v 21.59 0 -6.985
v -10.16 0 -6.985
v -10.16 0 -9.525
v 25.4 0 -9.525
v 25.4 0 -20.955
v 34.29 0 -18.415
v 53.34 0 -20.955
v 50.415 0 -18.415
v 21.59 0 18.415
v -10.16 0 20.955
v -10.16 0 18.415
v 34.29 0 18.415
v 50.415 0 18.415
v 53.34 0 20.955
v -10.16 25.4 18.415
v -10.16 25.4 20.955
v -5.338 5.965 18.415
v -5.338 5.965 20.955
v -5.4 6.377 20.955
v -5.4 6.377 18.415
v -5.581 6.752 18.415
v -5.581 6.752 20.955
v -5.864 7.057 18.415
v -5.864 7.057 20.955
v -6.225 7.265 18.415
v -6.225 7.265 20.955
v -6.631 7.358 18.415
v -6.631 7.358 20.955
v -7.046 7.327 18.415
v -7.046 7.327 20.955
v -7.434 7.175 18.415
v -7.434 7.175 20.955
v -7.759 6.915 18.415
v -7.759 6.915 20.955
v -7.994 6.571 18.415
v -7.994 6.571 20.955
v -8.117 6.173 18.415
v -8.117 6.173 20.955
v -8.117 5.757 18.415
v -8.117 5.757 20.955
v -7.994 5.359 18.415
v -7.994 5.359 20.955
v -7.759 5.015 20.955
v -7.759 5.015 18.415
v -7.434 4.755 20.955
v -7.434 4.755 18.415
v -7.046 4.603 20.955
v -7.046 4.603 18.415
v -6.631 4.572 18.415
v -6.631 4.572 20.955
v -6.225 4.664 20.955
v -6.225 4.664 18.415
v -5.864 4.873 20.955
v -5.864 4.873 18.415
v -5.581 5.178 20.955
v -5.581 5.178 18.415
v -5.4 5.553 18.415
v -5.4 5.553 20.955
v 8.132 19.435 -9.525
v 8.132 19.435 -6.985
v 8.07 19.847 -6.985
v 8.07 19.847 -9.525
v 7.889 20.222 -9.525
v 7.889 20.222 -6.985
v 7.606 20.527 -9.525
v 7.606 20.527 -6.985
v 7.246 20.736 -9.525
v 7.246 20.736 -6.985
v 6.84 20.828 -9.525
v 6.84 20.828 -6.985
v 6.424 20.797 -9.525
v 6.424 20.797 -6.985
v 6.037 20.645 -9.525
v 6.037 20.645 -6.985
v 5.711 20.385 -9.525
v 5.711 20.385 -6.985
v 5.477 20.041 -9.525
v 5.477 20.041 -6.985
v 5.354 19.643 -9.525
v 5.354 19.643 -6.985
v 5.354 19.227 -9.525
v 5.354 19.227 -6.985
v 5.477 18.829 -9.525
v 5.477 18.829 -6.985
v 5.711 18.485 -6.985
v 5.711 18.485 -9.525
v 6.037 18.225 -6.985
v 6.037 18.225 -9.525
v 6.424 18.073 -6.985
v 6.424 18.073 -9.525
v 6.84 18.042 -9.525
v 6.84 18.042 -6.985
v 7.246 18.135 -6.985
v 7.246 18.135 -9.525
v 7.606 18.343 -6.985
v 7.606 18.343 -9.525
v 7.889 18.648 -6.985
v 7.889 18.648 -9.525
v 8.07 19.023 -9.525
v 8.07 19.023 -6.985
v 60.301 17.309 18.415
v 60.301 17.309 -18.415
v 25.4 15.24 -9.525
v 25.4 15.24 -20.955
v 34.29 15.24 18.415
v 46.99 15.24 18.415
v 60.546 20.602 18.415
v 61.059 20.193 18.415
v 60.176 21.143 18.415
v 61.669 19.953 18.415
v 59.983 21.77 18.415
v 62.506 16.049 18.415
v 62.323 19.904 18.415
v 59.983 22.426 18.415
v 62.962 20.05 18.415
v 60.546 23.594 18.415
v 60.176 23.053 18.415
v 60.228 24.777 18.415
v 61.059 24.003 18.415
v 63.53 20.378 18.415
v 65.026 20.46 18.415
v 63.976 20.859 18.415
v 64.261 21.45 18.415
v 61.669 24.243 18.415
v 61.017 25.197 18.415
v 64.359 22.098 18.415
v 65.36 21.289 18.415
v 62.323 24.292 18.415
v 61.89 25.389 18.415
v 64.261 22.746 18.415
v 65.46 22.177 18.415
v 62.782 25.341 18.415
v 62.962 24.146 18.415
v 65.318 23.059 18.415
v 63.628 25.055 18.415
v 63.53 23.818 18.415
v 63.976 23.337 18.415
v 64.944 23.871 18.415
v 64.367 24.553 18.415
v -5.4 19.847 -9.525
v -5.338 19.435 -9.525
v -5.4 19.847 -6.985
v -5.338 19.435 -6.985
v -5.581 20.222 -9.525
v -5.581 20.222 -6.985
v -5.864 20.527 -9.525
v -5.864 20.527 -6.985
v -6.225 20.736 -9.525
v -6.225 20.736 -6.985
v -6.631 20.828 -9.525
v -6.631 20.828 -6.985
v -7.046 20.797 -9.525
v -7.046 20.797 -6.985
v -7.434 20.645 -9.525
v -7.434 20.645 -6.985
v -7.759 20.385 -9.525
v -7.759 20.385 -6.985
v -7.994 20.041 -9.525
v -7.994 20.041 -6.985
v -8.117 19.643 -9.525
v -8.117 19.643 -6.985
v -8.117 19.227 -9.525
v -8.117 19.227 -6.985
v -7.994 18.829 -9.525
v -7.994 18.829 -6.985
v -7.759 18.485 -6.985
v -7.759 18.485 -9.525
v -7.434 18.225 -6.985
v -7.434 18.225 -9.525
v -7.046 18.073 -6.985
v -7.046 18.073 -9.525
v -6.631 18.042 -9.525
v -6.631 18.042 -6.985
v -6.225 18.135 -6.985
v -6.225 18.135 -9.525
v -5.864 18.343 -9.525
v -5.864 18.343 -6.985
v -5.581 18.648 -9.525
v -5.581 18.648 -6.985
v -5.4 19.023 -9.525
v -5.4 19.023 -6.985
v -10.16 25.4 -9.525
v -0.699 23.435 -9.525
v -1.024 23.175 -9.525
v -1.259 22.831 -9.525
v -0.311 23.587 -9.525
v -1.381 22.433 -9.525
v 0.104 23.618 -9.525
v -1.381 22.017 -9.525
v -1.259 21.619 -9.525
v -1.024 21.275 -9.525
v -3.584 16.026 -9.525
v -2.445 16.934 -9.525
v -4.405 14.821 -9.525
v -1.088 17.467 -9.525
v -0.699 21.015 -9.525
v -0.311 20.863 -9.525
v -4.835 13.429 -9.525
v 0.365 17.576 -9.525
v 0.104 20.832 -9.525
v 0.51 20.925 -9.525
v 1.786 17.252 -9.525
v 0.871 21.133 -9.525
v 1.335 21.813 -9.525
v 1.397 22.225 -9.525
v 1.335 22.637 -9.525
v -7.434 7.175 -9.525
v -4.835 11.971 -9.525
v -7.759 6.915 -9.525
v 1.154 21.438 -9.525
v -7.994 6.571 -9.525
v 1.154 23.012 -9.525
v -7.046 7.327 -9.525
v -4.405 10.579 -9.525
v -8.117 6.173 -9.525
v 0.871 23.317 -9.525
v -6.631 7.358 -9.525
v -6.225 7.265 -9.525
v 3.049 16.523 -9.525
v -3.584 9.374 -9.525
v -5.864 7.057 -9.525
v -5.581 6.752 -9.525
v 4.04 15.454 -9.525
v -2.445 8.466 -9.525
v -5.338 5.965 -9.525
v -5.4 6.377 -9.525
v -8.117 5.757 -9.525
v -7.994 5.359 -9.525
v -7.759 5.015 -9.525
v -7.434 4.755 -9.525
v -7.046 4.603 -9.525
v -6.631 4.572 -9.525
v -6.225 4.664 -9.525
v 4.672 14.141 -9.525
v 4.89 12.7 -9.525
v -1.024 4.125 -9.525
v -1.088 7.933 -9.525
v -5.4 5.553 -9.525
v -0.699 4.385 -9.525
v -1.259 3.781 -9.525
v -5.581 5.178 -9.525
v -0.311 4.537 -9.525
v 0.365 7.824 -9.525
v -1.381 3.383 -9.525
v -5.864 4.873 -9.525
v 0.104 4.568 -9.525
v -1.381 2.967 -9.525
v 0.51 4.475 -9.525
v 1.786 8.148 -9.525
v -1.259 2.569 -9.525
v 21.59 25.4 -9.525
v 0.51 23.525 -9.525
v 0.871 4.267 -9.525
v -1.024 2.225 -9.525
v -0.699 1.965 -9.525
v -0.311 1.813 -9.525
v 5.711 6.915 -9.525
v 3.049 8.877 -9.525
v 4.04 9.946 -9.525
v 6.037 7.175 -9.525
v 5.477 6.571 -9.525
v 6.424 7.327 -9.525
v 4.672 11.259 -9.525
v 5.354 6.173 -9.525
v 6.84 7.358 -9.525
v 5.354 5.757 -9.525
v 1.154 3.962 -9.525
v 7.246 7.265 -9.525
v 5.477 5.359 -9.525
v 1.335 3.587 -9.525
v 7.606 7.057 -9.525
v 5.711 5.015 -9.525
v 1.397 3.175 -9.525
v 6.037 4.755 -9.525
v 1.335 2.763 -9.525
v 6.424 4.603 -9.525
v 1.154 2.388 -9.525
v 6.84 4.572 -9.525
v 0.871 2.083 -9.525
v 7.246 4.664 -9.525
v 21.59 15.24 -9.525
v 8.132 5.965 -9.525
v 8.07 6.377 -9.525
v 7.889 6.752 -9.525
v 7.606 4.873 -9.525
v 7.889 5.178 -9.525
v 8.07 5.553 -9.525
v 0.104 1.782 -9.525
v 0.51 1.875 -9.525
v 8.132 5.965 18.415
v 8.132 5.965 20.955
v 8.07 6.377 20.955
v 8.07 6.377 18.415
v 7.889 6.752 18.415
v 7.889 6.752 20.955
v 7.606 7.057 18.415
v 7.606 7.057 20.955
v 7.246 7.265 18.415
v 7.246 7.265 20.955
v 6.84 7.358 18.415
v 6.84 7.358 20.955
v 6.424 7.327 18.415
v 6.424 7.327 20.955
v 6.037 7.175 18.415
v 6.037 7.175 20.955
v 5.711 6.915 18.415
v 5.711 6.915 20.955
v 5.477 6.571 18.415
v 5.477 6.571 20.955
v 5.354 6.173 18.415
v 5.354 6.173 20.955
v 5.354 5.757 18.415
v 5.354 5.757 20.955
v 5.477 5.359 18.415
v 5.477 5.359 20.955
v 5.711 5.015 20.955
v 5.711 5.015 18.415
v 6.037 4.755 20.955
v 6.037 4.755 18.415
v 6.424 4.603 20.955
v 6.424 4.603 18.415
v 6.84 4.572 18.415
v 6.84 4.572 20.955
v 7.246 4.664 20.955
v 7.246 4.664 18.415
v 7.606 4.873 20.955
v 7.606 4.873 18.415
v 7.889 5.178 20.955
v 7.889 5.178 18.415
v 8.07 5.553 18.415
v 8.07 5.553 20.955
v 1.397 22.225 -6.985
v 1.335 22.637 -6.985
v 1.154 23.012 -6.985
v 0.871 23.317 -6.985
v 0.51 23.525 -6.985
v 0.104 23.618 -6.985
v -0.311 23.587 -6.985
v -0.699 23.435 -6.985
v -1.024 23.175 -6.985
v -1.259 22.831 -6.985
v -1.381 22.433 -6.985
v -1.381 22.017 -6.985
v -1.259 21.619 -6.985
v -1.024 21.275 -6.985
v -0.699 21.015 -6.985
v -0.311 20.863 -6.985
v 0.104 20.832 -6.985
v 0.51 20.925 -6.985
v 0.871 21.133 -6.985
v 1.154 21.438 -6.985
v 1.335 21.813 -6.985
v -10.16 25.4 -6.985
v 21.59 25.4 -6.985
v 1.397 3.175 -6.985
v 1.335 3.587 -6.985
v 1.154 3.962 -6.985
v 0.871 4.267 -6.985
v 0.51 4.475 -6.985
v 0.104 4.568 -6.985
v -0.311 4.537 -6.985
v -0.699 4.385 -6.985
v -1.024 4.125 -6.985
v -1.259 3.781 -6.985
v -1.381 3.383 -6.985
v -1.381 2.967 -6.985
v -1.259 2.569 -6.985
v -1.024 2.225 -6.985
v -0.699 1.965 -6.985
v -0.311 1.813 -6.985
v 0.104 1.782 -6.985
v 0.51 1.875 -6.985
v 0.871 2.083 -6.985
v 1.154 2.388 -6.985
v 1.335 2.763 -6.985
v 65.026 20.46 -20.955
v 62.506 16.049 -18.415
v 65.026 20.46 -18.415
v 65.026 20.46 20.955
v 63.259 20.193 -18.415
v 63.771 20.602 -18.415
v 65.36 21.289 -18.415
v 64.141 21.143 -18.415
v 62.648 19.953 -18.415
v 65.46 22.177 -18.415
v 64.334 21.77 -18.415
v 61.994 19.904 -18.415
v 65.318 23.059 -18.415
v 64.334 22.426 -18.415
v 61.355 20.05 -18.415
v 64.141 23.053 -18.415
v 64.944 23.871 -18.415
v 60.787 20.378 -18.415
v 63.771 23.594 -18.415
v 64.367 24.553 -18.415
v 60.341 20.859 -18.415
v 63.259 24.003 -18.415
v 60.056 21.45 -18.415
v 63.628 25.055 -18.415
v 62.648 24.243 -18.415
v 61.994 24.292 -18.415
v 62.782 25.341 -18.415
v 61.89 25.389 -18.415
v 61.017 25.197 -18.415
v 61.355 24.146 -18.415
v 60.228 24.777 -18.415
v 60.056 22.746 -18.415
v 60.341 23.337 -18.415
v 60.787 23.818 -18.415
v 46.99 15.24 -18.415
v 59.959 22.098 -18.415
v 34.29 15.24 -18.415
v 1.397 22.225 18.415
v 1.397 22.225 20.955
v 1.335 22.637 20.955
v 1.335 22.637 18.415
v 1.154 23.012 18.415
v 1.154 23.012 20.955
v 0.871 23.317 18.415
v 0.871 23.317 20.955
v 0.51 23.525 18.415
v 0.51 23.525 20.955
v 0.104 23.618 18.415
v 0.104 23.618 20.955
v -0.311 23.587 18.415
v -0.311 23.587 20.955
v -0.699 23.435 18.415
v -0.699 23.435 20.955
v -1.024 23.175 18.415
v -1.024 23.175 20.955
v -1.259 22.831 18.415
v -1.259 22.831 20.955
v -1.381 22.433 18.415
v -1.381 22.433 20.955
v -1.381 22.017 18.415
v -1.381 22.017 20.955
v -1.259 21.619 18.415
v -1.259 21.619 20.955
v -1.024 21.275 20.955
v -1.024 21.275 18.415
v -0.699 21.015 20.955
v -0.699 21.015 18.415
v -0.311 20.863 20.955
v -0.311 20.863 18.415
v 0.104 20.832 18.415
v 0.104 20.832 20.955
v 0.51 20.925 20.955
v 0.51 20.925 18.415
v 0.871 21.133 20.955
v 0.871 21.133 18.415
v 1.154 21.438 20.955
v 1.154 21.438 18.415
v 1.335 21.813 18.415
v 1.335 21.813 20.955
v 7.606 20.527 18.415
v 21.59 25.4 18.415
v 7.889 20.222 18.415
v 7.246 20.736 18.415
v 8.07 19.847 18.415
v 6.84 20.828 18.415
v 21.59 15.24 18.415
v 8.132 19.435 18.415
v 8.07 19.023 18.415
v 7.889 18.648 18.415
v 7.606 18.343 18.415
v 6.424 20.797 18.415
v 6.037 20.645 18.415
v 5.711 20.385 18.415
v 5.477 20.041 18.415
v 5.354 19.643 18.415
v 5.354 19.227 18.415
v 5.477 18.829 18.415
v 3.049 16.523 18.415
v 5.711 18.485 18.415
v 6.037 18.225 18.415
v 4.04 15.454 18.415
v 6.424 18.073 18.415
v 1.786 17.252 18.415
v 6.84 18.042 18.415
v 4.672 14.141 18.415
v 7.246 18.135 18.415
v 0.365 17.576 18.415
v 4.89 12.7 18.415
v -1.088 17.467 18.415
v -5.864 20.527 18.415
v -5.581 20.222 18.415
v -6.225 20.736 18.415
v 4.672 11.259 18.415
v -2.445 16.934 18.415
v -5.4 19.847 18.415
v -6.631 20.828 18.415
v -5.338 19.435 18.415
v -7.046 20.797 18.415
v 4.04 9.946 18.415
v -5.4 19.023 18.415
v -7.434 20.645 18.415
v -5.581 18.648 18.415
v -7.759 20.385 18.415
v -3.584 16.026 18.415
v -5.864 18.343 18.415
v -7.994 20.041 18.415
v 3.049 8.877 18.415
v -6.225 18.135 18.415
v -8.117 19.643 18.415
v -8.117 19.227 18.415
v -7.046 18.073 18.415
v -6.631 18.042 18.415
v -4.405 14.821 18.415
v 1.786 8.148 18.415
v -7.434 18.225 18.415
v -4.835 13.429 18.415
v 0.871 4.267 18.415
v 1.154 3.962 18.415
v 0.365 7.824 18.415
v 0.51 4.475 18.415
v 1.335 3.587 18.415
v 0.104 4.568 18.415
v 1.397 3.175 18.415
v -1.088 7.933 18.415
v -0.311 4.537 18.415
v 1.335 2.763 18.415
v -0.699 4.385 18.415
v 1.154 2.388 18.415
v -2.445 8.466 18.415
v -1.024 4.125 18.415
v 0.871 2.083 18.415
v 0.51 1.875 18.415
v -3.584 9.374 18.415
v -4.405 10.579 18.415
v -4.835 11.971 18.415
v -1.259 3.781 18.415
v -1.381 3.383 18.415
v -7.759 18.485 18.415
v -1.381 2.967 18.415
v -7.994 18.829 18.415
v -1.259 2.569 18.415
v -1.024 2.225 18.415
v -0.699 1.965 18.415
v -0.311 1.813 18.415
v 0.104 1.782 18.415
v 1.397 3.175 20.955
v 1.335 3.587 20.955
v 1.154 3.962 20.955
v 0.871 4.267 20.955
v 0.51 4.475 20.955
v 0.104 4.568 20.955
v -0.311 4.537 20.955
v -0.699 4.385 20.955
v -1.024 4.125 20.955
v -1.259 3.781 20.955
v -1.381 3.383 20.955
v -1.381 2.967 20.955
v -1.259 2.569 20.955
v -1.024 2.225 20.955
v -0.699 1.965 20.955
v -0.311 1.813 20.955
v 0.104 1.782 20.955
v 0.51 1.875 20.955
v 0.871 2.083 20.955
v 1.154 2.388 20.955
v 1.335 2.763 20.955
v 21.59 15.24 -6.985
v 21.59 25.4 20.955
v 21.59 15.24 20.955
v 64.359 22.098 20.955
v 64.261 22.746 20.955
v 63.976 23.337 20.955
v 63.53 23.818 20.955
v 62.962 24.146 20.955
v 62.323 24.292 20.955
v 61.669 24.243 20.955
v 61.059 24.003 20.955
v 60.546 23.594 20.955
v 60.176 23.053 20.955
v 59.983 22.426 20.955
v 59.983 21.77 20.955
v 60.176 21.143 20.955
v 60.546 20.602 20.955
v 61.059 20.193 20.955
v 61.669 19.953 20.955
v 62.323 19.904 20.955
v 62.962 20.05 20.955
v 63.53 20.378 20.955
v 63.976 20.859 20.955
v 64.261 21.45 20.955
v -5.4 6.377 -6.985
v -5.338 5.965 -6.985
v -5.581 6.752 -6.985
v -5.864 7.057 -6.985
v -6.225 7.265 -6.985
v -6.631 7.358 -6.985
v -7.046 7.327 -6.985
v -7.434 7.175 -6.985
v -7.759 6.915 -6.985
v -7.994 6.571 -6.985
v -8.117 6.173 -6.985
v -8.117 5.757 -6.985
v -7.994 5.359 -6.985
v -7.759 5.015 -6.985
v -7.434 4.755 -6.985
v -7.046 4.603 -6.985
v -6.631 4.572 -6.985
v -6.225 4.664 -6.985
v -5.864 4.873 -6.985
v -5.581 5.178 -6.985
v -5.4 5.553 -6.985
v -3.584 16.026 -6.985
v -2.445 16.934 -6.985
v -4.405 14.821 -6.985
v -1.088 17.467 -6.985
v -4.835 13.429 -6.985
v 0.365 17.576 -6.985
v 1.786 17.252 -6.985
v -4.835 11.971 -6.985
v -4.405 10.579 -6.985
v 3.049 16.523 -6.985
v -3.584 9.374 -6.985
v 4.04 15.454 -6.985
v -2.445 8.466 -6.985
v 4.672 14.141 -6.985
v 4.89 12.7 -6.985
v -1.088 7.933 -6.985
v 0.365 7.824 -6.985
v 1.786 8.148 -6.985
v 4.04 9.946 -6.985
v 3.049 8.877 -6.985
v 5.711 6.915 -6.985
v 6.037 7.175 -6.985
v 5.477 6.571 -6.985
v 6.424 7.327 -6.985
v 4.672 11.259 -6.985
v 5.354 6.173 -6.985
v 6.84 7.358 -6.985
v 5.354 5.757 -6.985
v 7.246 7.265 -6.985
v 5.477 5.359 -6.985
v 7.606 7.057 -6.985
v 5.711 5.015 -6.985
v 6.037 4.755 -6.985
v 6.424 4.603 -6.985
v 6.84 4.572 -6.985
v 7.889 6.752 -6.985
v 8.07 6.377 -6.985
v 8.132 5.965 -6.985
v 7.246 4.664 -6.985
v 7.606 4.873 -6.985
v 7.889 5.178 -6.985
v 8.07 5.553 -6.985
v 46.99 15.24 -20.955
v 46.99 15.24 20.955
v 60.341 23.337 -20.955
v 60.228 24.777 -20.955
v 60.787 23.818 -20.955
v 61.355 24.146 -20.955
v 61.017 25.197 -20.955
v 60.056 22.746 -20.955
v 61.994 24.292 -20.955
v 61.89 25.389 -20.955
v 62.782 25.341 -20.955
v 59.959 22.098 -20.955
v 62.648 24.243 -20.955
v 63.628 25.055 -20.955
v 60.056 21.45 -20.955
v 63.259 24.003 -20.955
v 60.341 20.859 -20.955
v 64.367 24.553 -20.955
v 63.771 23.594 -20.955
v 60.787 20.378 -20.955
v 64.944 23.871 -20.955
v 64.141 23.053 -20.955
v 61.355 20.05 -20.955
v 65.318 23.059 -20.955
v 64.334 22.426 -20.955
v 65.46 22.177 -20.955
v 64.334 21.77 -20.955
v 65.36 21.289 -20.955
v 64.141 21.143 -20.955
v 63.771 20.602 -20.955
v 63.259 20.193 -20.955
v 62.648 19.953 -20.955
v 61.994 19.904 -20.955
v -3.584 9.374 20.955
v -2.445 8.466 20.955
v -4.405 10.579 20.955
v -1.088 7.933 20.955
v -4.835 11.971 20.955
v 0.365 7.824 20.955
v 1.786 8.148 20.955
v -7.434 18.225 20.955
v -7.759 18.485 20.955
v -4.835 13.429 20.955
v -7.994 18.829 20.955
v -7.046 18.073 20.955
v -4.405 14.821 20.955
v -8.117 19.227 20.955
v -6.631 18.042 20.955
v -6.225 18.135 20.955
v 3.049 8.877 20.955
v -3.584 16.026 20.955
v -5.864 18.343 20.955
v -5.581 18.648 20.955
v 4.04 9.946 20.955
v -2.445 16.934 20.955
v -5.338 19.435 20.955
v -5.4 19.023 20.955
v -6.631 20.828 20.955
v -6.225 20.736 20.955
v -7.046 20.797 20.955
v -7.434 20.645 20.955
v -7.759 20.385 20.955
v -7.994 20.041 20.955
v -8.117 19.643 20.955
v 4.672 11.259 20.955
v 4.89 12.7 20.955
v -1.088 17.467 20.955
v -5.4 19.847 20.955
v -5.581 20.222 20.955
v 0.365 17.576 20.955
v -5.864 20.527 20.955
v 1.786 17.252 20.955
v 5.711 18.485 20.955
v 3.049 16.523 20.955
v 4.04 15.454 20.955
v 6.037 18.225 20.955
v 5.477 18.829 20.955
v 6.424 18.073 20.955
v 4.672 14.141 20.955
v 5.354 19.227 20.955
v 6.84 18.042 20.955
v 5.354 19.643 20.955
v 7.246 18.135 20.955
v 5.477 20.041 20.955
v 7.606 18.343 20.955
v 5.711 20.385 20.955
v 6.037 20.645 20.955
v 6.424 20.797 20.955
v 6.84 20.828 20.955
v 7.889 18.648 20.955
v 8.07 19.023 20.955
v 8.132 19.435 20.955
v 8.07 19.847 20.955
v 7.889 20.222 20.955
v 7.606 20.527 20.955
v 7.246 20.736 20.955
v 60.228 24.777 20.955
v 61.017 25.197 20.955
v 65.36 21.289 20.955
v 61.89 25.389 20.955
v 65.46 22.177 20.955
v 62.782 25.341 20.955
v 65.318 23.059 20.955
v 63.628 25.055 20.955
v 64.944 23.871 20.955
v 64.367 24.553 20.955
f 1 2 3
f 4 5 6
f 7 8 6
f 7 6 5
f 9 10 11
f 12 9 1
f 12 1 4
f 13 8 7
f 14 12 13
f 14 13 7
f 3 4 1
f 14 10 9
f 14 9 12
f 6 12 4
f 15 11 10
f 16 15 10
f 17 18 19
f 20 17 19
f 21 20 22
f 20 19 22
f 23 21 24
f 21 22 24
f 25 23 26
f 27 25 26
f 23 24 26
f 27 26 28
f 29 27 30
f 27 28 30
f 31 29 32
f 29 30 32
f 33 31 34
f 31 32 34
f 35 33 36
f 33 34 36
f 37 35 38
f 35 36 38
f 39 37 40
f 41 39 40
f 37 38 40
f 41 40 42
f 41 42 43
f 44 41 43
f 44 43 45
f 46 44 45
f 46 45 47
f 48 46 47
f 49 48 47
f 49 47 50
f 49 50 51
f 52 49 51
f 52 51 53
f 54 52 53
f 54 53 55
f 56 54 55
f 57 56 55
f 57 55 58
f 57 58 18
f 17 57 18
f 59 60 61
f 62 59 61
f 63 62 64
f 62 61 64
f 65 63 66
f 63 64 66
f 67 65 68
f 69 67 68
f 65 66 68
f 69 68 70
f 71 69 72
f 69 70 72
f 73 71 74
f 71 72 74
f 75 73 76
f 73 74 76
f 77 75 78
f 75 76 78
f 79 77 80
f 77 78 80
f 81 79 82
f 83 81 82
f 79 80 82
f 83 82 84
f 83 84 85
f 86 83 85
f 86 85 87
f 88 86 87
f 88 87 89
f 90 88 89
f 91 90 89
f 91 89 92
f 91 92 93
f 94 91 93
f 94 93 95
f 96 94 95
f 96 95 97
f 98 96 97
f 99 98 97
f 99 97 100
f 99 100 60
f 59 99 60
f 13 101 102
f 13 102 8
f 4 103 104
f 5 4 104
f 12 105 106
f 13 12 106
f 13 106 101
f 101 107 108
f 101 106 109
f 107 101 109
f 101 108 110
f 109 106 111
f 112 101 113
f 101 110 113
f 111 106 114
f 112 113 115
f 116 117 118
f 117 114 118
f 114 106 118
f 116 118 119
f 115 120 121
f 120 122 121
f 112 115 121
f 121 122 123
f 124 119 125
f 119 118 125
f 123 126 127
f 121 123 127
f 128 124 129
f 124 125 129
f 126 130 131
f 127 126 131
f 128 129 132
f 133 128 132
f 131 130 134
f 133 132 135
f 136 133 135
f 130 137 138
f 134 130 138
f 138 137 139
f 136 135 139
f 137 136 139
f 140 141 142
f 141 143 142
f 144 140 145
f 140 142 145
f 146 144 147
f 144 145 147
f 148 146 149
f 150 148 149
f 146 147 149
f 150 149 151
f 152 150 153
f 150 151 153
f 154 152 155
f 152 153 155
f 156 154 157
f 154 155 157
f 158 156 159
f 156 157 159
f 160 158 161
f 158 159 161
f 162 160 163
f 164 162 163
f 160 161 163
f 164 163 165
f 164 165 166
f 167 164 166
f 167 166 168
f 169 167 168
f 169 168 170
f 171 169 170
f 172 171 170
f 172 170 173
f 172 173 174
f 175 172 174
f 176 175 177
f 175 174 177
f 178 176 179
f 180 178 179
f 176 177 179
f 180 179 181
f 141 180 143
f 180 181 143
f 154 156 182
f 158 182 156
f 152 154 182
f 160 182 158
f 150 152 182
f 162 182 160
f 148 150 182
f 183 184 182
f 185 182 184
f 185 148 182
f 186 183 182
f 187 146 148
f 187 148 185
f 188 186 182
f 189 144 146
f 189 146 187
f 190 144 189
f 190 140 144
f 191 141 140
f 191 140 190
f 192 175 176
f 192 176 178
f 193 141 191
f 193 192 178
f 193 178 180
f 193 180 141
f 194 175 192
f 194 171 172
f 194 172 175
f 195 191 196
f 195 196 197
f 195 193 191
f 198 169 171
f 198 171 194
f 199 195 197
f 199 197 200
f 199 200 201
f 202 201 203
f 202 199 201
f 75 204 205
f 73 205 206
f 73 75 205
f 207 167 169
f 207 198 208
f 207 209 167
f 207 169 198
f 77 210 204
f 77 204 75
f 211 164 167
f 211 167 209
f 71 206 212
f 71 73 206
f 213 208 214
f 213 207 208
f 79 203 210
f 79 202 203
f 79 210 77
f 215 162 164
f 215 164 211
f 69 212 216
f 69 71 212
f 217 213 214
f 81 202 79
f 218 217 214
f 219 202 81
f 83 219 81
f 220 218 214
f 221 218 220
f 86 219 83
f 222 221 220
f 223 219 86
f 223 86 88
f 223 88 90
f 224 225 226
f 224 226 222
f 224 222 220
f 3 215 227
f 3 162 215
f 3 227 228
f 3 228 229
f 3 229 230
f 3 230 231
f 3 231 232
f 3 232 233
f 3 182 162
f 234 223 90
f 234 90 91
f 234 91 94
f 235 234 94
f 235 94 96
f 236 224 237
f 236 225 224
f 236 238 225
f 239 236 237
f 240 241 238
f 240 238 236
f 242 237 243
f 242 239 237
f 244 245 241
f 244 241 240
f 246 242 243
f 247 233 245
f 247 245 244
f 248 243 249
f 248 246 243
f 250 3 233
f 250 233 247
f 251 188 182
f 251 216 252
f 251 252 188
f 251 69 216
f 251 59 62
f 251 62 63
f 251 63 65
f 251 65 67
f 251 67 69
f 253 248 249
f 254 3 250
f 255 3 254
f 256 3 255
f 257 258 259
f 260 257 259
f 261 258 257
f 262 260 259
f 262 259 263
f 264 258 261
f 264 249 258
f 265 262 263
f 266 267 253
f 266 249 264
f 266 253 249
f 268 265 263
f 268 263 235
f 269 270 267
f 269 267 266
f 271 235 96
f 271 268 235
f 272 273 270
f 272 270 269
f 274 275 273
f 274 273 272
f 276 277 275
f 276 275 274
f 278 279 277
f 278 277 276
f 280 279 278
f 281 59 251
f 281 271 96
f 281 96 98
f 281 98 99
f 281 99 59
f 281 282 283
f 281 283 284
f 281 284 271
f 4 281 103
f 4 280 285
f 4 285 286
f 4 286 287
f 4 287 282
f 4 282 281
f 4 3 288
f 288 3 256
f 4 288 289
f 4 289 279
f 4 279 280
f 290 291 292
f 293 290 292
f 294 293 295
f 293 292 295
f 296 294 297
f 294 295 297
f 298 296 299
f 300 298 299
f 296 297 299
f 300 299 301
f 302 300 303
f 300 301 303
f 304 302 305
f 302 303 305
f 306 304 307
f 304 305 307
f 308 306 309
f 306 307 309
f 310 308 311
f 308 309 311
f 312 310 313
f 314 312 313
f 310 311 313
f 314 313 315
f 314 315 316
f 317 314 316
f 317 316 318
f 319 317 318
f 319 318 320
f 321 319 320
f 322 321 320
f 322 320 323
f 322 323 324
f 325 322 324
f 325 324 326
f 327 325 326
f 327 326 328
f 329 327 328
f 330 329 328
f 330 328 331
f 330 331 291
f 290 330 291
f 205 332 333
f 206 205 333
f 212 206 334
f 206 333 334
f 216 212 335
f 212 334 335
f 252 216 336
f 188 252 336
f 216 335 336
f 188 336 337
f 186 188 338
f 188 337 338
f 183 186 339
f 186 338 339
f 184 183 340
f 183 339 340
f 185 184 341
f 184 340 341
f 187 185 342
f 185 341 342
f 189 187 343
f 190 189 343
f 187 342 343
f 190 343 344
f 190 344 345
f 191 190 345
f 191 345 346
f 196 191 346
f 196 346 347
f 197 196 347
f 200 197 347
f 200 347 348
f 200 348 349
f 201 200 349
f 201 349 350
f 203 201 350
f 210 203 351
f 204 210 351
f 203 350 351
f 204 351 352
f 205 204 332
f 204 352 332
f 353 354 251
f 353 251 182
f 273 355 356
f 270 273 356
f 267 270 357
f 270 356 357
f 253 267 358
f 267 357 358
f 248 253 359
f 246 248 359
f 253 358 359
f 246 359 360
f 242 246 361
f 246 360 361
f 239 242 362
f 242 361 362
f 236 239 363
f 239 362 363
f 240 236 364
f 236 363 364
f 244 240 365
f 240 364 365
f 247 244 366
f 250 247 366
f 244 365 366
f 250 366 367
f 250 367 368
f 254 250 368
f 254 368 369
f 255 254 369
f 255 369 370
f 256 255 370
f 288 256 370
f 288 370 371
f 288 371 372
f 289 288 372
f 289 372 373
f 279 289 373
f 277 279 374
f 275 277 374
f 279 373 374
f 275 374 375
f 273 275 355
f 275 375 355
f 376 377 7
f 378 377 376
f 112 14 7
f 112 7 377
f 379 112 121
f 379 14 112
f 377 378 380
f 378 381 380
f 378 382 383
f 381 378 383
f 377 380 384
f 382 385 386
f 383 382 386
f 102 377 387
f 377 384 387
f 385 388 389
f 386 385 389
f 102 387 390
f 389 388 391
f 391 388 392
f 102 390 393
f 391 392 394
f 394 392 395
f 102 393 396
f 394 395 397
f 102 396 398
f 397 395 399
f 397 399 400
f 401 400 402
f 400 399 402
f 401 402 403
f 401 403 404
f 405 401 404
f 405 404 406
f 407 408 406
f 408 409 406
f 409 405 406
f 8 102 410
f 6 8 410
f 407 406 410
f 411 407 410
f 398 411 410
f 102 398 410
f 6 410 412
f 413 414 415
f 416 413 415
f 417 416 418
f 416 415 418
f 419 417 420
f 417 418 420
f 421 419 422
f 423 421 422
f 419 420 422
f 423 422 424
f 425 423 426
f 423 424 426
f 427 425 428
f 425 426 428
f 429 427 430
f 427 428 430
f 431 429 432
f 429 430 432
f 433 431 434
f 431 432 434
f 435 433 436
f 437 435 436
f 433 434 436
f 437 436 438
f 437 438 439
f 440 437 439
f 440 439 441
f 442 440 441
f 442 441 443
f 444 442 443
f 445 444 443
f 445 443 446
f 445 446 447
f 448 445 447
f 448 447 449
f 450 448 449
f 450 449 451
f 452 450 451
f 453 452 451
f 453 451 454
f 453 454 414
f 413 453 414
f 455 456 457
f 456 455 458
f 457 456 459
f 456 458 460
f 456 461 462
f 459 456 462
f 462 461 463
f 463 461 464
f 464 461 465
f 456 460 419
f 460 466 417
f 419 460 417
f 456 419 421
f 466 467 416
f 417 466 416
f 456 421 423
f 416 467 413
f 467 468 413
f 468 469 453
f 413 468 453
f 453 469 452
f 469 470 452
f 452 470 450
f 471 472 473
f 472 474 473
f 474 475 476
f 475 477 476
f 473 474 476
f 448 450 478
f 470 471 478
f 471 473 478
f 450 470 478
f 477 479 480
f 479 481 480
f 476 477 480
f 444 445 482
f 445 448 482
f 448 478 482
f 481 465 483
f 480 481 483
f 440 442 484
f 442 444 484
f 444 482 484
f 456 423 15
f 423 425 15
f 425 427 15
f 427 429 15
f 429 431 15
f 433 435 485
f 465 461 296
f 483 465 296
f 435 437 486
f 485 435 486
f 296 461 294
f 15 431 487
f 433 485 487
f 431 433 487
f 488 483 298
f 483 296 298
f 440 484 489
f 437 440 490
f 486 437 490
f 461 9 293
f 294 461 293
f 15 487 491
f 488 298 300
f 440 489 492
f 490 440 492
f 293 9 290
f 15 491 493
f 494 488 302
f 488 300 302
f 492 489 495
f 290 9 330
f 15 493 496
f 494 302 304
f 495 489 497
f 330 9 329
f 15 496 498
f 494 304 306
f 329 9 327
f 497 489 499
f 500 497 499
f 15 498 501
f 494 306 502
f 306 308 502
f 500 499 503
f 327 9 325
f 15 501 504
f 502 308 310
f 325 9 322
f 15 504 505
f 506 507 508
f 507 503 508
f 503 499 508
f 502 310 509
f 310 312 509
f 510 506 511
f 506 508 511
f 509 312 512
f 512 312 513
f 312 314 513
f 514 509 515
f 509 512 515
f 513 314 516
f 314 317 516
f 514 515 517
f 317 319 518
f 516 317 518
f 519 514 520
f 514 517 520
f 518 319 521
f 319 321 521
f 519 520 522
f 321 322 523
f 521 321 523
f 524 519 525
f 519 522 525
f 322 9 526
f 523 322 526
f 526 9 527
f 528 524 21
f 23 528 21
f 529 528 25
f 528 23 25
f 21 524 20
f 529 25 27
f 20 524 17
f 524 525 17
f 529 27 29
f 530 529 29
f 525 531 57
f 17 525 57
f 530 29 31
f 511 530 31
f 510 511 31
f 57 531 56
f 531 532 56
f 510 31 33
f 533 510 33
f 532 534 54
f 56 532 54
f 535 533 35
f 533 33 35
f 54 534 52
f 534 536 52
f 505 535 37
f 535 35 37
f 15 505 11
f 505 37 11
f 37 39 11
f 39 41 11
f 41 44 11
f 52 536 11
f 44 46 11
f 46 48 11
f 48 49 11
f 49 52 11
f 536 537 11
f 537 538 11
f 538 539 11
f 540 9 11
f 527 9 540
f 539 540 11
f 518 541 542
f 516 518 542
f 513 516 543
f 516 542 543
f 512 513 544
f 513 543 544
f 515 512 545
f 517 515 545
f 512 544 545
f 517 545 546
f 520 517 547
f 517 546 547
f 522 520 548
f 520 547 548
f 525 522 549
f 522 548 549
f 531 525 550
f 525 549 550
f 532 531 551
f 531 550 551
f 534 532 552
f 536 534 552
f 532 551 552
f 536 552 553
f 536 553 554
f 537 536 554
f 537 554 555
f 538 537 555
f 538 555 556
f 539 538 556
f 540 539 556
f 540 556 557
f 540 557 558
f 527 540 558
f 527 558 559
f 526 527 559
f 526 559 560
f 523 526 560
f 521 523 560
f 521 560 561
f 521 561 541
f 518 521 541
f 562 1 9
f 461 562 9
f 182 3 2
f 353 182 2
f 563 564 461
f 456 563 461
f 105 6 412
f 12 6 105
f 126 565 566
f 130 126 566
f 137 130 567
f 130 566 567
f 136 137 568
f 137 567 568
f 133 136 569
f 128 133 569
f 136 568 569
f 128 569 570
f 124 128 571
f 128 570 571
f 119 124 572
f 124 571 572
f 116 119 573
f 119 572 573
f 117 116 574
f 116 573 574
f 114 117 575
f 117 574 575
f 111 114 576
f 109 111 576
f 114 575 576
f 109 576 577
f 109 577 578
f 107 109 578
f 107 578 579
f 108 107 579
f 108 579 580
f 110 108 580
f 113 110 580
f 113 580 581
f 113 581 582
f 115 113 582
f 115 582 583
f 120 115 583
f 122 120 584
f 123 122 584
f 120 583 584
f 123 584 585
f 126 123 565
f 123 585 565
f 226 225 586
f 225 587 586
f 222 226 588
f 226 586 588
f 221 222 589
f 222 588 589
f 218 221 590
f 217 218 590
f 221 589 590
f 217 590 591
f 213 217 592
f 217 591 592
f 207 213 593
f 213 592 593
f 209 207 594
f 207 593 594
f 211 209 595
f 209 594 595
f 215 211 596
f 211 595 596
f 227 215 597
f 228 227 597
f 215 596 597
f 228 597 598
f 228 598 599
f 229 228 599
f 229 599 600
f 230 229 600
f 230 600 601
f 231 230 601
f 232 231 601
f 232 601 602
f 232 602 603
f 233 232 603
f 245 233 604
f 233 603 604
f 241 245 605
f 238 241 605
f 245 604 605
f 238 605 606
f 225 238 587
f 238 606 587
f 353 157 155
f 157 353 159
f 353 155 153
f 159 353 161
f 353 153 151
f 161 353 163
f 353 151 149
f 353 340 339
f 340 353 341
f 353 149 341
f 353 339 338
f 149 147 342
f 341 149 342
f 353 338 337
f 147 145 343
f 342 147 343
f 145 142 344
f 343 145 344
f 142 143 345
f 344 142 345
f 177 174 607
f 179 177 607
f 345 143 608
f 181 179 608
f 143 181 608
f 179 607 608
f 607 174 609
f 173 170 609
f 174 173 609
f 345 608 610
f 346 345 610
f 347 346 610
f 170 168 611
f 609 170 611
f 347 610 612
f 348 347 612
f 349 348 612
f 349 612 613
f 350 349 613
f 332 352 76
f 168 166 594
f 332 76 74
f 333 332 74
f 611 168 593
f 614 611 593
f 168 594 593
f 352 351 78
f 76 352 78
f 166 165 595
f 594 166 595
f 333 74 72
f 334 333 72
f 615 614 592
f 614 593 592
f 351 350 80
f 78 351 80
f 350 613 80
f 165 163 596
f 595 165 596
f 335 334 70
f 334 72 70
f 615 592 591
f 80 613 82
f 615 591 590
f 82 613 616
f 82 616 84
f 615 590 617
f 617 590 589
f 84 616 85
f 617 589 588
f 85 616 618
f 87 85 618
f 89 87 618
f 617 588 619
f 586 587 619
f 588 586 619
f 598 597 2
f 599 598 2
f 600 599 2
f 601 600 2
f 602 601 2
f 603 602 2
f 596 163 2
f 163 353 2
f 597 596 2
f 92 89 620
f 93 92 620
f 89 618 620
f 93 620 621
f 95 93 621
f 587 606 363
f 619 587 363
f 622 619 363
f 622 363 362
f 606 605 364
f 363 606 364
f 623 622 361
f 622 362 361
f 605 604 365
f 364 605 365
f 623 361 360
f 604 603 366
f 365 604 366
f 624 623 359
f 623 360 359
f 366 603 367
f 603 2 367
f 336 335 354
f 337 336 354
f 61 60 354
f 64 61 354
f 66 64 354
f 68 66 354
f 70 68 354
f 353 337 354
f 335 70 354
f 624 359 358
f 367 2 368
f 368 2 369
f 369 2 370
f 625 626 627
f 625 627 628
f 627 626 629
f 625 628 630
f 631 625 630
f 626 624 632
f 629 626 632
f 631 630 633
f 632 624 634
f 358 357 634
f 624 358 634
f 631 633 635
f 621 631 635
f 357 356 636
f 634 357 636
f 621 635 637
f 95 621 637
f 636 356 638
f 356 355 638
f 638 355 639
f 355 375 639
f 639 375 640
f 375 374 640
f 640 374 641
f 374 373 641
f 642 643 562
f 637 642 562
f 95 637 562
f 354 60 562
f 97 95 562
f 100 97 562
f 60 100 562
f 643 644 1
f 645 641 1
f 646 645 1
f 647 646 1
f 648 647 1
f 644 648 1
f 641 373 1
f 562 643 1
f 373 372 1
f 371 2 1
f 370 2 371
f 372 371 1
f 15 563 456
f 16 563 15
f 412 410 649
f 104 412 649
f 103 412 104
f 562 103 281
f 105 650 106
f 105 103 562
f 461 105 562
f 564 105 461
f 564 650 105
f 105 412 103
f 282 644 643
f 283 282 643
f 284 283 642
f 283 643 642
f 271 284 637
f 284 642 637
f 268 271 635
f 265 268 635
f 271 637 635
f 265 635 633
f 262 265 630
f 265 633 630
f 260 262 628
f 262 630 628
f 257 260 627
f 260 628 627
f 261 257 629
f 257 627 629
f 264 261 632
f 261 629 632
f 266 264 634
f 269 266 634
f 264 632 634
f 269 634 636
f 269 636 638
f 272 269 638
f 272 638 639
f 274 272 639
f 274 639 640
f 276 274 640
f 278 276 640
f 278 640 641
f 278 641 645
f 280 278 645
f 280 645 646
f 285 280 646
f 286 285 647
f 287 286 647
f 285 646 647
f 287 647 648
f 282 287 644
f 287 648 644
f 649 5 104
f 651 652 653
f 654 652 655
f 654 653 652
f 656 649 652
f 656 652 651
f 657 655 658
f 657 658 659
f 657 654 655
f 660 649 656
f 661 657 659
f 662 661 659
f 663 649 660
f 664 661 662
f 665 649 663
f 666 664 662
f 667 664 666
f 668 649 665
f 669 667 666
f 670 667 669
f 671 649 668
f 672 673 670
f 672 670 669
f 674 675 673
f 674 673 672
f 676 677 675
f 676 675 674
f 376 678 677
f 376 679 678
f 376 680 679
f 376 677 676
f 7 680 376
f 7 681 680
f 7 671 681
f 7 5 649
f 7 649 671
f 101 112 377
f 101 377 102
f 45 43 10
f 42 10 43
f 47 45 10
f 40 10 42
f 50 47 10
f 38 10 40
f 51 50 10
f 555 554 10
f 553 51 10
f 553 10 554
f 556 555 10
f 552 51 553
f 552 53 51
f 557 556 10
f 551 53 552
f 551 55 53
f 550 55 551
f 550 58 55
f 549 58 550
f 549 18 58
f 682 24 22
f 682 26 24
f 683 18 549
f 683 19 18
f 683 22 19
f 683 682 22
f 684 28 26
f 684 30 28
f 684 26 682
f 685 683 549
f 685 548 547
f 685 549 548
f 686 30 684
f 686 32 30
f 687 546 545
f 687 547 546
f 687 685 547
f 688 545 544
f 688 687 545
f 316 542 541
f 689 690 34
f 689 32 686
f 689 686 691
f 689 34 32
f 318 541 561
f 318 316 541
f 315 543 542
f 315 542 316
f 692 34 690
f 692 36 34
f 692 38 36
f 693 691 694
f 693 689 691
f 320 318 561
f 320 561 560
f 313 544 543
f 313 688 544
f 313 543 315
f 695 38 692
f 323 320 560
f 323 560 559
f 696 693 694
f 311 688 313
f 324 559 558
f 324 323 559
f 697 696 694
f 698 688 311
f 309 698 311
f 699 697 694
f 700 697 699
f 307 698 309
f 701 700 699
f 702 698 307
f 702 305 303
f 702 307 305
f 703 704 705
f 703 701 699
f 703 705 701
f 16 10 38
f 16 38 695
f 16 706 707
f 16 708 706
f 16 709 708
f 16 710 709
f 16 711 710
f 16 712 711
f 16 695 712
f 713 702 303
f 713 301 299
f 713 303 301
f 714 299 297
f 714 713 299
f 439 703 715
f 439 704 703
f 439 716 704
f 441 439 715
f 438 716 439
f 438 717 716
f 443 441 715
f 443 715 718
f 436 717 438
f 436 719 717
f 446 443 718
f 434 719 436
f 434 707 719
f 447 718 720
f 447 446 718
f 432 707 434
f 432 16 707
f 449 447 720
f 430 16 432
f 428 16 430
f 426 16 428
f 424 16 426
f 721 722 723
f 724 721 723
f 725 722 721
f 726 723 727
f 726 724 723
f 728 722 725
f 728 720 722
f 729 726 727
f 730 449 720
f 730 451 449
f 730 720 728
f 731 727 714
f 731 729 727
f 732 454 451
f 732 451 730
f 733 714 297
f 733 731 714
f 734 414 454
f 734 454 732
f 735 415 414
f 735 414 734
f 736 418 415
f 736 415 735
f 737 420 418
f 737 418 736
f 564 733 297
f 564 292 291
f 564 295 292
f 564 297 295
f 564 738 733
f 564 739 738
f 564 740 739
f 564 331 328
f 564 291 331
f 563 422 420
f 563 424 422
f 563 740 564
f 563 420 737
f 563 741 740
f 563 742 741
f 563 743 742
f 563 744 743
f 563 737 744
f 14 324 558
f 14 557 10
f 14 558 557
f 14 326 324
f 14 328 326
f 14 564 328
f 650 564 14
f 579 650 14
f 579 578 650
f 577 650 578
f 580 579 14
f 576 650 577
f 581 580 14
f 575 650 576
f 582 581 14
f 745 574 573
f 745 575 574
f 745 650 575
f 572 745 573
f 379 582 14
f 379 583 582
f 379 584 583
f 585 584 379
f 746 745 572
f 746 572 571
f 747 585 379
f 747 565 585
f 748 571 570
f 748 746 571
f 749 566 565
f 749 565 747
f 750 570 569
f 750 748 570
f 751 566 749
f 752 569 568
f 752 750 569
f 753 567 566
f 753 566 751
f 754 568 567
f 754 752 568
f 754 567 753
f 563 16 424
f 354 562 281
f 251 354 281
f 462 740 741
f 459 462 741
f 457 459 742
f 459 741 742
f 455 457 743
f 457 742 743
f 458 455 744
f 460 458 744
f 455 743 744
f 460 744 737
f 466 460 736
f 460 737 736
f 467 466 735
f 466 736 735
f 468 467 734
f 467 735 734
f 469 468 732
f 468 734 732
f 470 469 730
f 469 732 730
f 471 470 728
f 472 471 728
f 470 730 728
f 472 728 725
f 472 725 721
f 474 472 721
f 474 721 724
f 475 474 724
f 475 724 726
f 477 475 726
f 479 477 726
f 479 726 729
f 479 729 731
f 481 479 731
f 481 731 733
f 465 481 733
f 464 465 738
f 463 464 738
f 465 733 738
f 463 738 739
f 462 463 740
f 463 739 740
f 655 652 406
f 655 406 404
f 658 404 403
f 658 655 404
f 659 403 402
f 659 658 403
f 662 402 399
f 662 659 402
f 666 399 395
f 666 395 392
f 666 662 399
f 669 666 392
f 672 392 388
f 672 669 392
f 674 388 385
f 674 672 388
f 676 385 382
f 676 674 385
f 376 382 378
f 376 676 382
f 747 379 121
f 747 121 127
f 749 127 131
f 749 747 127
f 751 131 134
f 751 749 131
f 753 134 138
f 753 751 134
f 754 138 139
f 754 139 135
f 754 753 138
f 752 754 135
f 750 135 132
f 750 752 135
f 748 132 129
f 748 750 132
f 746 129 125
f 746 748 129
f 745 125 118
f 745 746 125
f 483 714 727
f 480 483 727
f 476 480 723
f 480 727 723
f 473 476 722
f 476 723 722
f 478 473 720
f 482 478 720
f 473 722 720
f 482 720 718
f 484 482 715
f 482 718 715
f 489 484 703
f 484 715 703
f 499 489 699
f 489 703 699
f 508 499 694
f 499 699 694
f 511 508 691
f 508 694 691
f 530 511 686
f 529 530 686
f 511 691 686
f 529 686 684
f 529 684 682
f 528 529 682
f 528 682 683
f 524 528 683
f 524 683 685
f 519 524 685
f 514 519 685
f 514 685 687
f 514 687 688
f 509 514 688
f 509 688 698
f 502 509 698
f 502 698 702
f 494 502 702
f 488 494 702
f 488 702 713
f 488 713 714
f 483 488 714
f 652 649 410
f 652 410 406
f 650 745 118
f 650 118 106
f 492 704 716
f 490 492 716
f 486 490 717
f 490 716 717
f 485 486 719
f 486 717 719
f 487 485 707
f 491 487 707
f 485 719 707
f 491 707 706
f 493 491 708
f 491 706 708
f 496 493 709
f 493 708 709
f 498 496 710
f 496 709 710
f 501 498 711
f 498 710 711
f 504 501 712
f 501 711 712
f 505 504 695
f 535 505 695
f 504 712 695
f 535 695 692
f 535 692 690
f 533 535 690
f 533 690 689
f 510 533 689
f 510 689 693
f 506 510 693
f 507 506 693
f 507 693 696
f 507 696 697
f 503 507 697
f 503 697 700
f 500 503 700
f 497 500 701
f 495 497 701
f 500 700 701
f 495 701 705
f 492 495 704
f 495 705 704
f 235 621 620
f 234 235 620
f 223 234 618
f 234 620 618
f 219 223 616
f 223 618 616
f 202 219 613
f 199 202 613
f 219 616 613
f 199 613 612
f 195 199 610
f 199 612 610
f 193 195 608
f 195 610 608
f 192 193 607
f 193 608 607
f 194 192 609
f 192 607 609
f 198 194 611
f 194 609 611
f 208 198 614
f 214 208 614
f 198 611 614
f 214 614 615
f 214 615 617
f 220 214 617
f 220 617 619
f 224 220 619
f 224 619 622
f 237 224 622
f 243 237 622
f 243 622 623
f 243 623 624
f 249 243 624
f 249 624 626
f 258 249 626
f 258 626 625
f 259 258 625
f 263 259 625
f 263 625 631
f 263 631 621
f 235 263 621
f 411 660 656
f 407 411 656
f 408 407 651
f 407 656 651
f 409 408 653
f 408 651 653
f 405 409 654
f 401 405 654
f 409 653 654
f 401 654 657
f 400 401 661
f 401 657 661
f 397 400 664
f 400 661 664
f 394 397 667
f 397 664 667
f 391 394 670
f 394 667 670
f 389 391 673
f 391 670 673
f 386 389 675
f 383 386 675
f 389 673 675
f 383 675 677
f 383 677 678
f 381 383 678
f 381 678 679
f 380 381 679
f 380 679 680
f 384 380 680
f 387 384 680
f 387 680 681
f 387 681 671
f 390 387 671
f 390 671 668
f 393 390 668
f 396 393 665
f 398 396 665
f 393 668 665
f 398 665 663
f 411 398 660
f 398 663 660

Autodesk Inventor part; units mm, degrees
ref_plane "YZ Plane" through (0, 0, 0) normal (1, 0, 0) x (0, 1, 0)
ref_plane "XZ Plane" through (0, 0, 0) normal (0, 1, 0) x (-1, 0, 0)
ref_plane "XY Plane" through (0, 0, 0) normal (0, 0, 1) x (1, 0, 0)
sketch "Sketch1" plane through (0, 0, 0) normal (0, 1, 0) x (-1, 0, 0)
  line L0 (10.16, 20.955) -> (-21.59, 20.955)
  line L1 (-21.59, 20.955) -> (-21.59, 18.415)
  line L2 (-21.59, 18.415) -> (10.16, 18.415)
  line L3 (10.16, 18.415) -> (10.16, 20.955)
  line L4 (10.16, -6.985) -> (-21.59, -6.985)
  line L5 (-21.59, -6.985) -> (-21.59, -9.525)
  line L6 (-21.59, -9.525) -> (10.16, -9.525)
  line L7 (10.16, -9.525) -> (10.16, -6.985)
  point P0 (0, 0)
  dimension "d0" = 31.75
  dimension "d1" = 2.54
  dimension "d2" = 10.16
  dimension "d3" = 20.955
  dimension "d4" = 31.75
  dimension "d5" = 2.54
  dimension "d6" = 10.16
  dimension "d7" = 30.48
extrude "Extrusion1" add sketch "Sketch1" along normal blind 25.4
sketch "Sketch2" plane through (0, 0, 0) normal (0, 1, 0) x (-1, 0, 0)
  line L0 (-21.59, 18.415) -> (10.16, 18.415) projected
  line L1 (10.16, -6.985) -> (-21.59, -6.985) projected
  line L2 (-21.59, 18.415) -> (-34.29, 18.415)
  line L3 (10.16, 18.415) -> (10.16, 20.955) projected
  line L4 (-21.59, -9.525) -> (-25.4, -9.525)
  line L5 (-21.59, -6.985) -> (-21.59, -9.525) projected
  line L6 (-21.59, -9.525) -> (-21.59, 18.415)
  line L7 (-25.4, -9.525) -> (-25.4, -20.955)
  line L8 (-25.4, -20.955) -> (-34.29, -20.955)
  line L9 (-34.29, -20.955) -> (-34.29, 18.415)
  line L10 (-21.59, 18.415) -> (10.16, 18.415) projected
  line L11 (10.16, -9.525) -> (10.16, -6.985) projected
  line L12 (10.16, 20.955) -> (-21.59, 20.955) projected
  point P0 (0, 0)
  point P1 (-21.59, -6.985)
  dimension "d16" = 35.56
  dimension "d17" = 41.91
  dimension "d18" = 12.7
extrude "Extrusion2" add sketch "Sketch2" along normal blind 15.24
sketch "Sketch4" plane through (0, 0, 0) normal (0, 1, 0) x (-1, 0, 0)
  line L0 (-34.29, -20.955) -> (-25.4, -20.955) projected
  line L1 (-34.29, -20.955) -> (-53.34, -20.955)
  line L2 (-53.34, -20.955) -> (-53.34, -18.415)
  line L3 (-53.34, -18.415) -> (-34.29, -18.415)
  line L4 (-34.29, -18.415) -> (-34.29, -20.955)
  line L5 (-21.59, 20.955) -> (-53.34, 20.955)
  line L6 (-53.34, 20.955) -> (-53.34, 18.415)
  line L7 (-53.34, 18.415) -> (-21.59, 18.415)
  line L8 (-21.59, 18.415) -> (-21.59, 20.955)
  line L9 (10.16, 18.415) -> (10.16, 20.955) projected
  line L10 (10.16, -9.525) -> (10.16, -6.985) projected
  point P0 (0, 0)
  point P1 (-50.8, -18.415)
  dimension "d20" = 2.54
  dimension "d24" = 2.54
  dimension "d55" = 63.5
  dimension "d56" = 63.5
extrude "Extrusion3" add sketch "Sketch4" along normal blind 15.24
sketch "Sketch5" plane through (-10.16, 25.4, 20.955) normal (0, 0, 1) x (1, 0, 0)
  circle A0 centre (10.16, -12.7) radius 4.8895
  line L0 (0, -25.4) -> (0, 0) projected
  line L1 (-16.3, -25.4) -> (92.4658, -25.4) projected
  circle A1 centre (10.16, -22.225) radius 1.397
  circle A2 centre (16.8952, -19.4352) radius 1.397
  circle A3 centre (19.685, -12.7) radius 1.397
  circle A4 centre (16.8952, -5.9648) radius 1.397
  circle A5 centre (10.16, -3.175) radius 1.397
  circle A6 centre (3.4248, -5.9648) radius 1.397
  circle A7 centre (0.635, -12.7) radius 1.397
  circle A8 centre (3.4248, -19.4352) radius 1.397
  point P0 (10.16, -25.4)
  dimension "d26" = 9.779
  dimension "d27" = 10.16
  dimension "d28" = 12.7
  dimension "d29" = 2.794
  dimension "d30" = 9.525
  dimension "d33" = 360
extrude "Extrusion4" cut sketch "Sketch5" against normal through all contours A0 | A1 | A2 | A4 | A5 | A6 | A8
sketch "Sketch6" plane through (-10.16, 25.4, 20.955) normal (0, 0, 1) x (1, 0, 0)
  circle A0 centre (72.3186, -3.302) radius 2.2
  circle A1 centre (10.16, -12.7) radius 4.8895 construction
  line L0 (0, 0) -> (31.75, 0) construction
  line L1 (75.6206, -25.4) -> (75.6206, 0) construction
  line L2 (75.6206, -25.4) -> (101.0206, -25.4) construction
  arc A2 (75.1858, -4.9396) -> (70.3884, -0.6228) centre (72.3186, -3.302) ccw
  line L3 (63.5, -25.4) -> (44.45, -25.4) construction
  line L4 (75.1858, -4.9396) -> (98.796, -4.9396) construction
  line L5 (70.3884, -0.6228) -> (57.15, -10.16)
  line L6 (63.5, -10.16) -> (44.45, -10.16) construction
  line L7 (63.5, -25.4) -> (63.5, -10.16) construction
  line L8 (31.75, -10.16) -> (63.5, -10.16) projected
  line L9 (0, -25.4) -> (63.5, -25.4) projected
  line L10 (75.1858, -4.9396) -> (63.5, -25.4)
  line L11 (57.15, -10.16) -> (63.5, -25.4)
  point P0 (10.16, -25.4)
  point P1 (60.96, -25.4)
  point P2 (60.96, -10.16)
  dimension "d37" = 4.4
  dimension "d38" = 62.865
  dimension "d39" = 3.302
  dimension "d40" = 25.4
  dimension "d41" = 90
  dimension "d42" = 3.302
  dimension "d53" = 6.604
  dimension "d57" = 6.35
extrude "Extrusion8" add sketch "Sketch6" against normal blind 2.54
sketch "Sketch9" plane through (25.4, 0, -20.955) normal (0, 0, -1) x (-1, 0, 0)
  line L0 (-39.6182, 20.447) -> (-27.94, 0.2198) projected
  line L1 (-21.59, 15.24) -> (-34.8284, 24.7772) projected
  arc A0 (-34.8284, 24.7772) -> (-39.6258, 20.4604) centre (-36.7586, 22.098) ccw projected
  circle A1 centre (-36.7586, 22.098) radius 2.2 projected
  line L2 (-39.6258, 20.4604) -> (-27.94, 0) projected
  line L3 (-27.94, 0) -> (-8.89, 0) projected
  line L4 (-21.59, 15.24) -> (-27.94, 0)
  point P0 (25.4, 0)
extrude "Extrusion10" add sketch "Sketch9" against normal blind 2.54
sketch "Sketch10" plane through (34.29, 0, 18.415) normal (0, 0, -1) x (-1, 0, 0)
  line L0 (-19.05, 0) -> (-30.7358, 20.4604) projected
  line L1 (-28.2164, 16.0491) -> (-26.0108, 17.3089)
  circle A0 centre (-27.8686, 22.098) radius 2.2 construction
  line L2 (44.45, 0) -> (-19.05, 0) construction
  line L3 (-19.05, 0) -> (-17.5875, 0) construction
  line L4 (-26.0108, 17.3089) -> (-16.1249, 0)
  line L5 (-16.1249, 0) -> (-19.05, 0)
  point P0 (34.29, 0)
  dimension "d64" = 2.54
  dimension "d65" = 5.08
extrude "Extrusion11" add sketch "Sketch10" along normal up to surface (36.83 mm away)
equation "\"d5\" = d1"
equation "\"d6\" = d2"
equation "\"d56\" = d55"
properties part number "Odometry holder for metal drive train"
